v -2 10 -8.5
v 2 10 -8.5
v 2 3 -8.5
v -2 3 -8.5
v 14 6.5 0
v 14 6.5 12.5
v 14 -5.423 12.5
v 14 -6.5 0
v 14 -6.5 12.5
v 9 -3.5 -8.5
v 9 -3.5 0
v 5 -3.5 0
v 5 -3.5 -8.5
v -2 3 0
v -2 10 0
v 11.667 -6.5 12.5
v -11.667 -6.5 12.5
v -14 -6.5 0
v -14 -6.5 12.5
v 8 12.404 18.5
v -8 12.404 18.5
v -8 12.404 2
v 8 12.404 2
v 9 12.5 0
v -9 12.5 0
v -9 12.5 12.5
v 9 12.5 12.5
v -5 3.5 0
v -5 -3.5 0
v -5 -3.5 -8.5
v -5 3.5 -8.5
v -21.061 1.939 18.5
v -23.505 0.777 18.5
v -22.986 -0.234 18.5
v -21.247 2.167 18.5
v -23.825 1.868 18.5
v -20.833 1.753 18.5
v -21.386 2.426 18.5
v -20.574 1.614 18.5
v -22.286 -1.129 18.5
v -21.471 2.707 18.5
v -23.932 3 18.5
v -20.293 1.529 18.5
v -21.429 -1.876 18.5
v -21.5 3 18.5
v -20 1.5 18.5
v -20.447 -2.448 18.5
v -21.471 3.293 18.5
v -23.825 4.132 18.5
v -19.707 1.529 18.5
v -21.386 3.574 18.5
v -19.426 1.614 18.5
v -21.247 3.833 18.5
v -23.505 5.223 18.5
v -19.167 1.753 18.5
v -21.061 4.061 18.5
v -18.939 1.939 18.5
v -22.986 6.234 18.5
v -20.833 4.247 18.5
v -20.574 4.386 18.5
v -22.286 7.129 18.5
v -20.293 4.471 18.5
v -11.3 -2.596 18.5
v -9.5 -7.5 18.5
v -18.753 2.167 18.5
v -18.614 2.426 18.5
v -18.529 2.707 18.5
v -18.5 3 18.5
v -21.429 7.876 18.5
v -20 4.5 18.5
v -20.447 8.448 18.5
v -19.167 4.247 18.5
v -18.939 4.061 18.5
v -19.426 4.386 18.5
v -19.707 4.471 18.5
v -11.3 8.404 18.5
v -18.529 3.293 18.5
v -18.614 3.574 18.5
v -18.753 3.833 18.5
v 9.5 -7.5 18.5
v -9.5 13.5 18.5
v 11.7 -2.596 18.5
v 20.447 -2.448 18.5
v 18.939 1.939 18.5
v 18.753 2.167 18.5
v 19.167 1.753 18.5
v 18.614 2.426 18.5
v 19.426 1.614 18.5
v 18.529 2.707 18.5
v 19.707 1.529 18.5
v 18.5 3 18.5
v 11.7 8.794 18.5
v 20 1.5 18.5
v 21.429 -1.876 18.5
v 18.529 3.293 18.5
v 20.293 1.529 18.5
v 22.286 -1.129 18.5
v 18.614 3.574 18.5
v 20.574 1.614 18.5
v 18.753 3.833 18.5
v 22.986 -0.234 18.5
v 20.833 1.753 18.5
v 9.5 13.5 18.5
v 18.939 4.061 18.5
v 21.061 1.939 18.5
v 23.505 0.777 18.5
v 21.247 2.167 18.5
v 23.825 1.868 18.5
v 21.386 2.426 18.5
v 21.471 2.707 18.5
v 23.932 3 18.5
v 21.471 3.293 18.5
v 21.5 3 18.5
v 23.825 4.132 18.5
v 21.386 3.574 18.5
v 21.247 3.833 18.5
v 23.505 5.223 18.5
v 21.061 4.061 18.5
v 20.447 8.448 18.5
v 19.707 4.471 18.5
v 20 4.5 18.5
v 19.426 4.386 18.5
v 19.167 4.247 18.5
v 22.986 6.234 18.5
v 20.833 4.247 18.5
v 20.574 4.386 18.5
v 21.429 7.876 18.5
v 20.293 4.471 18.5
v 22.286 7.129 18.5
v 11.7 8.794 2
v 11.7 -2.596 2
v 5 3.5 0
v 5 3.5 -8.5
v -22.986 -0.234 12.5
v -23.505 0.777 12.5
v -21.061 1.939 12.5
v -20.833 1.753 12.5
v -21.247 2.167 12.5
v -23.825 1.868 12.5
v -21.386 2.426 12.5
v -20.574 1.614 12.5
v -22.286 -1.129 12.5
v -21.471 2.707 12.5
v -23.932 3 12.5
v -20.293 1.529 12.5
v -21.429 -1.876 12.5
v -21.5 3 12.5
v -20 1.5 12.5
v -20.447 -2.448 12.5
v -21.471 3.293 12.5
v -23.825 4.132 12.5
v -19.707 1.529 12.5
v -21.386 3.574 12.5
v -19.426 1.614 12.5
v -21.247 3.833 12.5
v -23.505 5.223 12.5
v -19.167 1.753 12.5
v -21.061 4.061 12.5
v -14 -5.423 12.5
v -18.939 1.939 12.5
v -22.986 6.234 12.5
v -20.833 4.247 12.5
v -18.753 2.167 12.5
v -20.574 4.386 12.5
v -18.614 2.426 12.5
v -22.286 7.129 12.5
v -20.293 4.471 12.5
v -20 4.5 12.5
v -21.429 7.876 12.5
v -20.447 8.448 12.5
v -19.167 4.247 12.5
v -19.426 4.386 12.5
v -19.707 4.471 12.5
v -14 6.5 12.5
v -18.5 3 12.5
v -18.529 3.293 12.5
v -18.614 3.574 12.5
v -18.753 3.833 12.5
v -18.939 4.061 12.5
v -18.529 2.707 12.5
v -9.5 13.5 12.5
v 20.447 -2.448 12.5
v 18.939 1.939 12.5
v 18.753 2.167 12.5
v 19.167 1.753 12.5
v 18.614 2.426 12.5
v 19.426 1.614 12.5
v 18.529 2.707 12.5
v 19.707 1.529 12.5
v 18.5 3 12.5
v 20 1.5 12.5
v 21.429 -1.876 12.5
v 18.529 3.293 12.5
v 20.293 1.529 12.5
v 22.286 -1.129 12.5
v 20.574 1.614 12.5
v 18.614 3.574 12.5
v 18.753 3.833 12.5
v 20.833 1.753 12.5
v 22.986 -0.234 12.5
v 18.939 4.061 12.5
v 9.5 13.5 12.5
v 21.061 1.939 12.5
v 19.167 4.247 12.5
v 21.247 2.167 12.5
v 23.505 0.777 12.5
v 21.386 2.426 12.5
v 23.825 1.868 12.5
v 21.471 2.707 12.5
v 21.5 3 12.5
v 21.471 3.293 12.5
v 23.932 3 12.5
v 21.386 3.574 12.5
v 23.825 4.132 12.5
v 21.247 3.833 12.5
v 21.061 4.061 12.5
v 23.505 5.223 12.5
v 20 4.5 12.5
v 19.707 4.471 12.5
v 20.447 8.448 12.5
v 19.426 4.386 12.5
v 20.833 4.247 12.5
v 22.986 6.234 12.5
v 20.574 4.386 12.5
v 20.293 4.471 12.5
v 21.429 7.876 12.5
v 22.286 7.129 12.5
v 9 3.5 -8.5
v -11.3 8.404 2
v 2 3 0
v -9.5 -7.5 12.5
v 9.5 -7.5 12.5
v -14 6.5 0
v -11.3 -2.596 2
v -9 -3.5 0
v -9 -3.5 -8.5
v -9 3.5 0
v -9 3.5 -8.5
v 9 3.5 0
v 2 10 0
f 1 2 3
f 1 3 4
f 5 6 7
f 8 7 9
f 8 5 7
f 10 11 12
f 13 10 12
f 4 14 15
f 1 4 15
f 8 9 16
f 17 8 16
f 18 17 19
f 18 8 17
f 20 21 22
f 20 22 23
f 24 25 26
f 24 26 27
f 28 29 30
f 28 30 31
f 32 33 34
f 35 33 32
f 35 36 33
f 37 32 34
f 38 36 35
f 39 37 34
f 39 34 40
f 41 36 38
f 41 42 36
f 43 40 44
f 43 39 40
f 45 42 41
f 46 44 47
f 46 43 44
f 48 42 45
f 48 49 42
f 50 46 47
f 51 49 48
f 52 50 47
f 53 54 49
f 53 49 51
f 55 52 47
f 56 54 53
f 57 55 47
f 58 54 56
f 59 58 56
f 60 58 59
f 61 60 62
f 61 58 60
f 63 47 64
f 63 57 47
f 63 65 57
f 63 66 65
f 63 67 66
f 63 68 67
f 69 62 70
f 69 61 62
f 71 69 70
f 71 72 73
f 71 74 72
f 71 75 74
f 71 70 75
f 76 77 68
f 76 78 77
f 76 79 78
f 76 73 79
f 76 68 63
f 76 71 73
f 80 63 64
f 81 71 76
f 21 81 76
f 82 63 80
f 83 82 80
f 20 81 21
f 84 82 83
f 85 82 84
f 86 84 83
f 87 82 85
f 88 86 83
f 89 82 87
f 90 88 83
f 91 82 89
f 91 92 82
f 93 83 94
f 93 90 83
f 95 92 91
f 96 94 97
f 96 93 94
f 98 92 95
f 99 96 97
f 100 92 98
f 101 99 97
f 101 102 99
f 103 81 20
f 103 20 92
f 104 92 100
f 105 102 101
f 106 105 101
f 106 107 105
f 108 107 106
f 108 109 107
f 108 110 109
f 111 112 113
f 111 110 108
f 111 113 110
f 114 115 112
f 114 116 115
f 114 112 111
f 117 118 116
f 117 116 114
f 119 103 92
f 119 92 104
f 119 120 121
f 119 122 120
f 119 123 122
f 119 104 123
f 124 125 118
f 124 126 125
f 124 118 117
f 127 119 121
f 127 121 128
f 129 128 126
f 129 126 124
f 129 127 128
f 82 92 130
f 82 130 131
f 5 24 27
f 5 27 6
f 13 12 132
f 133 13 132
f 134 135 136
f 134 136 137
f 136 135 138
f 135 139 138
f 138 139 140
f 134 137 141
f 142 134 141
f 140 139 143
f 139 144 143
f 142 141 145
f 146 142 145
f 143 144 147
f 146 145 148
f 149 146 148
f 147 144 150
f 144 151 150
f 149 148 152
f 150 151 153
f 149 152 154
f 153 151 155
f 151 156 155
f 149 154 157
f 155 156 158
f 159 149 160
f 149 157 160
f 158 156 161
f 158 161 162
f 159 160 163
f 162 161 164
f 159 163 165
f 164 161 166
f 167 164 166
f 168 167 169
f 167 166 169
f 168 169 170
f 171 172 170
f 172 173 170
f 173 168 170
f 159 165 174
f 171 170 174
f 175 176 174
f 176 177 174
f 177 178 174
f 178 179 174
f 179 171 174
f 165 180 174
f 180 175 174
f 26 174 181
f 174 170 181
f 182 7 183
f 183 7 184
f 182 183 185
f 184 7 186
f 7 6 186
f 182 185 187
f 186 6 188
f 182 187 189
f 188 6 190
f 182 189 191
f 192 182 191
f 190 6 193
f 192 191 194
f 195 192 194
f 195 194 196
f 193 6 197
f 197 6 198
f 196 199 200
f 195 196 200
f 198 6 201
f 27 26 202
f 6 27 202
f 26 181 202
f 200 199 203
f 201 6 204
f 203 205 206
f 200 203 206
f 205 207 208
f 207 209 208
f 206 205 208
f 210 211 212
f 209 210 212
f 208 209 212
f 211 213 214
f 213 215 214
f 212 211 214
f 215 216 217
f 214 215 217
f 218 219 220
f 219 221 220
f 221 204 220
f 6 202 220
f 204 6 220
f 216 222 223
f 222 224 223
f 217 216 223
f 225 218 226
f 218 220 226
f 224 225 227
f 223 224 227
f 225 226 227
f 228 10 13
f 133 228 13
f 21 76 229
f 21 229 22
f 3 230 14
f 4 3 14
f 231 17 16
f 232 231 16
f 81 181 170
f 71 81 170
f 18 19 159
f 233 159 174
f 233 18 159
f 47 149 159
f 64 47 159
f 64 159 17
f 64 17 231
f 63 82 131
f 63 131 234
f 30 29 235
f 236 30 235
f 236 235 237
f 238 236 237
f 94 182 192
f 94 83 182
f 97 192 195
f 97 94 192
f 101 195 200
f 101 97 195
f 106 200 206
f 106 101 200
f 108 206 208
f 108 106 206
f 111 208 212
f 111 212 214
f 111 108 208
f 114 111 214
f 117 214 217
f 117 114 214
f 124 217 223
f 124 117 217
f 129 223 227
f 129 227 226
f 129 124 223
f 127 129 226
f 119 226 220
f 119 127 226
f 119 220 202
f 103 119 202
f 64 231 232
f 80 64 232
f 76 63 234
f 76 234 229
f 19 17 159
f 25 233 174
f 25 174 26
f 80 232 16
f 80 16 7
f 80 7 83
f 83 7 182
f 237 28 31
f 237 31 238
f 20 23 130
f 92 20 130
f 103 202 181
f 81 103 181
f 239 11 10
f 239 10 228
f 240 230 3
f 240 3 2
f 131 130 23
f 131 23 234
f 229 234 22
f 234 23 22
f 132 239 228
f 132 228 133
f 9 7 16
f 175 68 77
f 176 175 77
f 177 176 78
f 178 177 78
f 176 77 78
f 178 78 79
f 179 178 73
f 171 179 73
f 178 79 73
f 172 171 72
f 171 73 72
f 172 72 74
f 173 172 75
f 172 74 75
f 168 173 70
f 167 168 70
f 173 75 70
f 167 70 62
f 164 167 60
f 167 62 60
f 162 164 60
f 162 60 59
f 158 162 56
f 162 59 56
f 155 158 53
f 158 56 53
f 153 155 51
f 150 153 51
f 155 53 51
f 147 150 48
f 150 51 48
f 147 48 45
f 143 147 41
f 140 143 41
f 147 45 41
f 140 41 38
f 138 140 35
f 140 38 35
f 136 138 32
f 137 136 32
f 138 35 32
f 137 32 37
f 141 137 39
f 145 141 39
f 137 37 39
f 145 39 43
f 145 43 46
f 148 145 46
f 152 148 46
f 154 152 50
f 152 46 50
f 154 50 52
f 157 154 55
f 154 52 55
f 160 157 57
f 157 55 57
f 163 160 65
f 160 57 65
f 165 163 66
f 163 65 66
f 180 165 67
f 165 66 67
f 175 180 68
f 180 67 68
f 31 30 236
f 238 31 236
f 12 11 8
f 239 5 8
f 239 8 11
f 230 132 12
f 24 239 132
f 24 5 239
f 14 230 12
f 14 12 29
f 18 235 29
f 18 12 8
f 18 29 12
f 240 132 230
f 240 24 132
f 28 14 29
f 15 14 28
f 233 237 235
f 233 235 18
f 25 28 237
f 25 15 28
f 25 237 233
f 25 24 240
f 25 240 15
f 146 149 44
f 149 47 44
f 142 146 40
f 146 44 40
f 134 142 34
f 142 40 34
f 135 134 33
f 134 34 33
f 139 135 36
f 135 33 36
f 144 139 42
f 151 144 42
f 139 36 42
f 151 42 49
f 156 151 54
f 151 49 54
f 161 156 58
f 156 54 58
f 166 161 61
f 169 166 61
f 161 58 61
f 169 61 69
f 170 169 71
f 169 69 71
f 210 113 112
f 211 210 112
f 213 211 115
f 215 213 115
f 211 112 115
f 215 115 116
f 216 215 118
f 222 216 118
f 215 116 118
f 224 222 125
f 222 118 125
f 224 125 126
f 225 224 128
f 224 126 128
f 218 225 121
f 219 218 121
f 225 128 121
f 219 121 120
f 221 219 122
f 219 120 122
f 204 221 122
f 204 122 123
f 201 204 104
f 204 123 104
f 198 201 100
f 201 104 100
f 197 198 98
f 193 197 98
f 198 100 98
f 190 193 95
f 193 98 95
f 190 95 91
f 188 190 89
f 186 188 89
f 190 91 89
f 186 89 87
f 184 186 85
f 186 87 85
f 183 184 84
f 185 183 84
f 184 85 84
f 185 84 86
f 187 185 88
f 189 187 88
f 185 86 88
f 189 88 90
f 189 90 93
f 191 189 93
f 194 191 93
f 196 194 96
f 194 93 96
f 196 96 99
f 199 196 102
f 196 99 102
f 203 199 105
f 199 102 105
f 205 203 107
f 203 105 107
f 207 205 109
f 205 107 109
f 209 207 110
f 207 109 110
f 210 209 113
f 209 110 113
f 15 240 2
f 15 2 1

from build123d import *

# Parameters (mm, degrees)
RESSALTO_EXTRUS_O1_DEPTH = 12.5
ESBO_O2_W                = 4
ESBO_O2_H                = 7
RESSALTO_EXTRUS_O2_DEPTH = 8.5
RESSALTO_EXTRUS_O3_DEPTH = 6
ESBO_O4_R                = 1.5
CORTE_EXTRUS_O1_DEPTH    = 6
FILETE1_R                = 6
CORTE_EXTRUS_O2_DEPTH    = 16.5


with BuildPart() as part:
    # Esboço1 → Ressalto-extrusão1 (new body)
    with BuildSketch(Plane.XY):
        Polygon((-9, 12.5), (9, 12.5), (14, 6.5), (14, -6.5), (-14, -6.5), (-14, 6.5), align=None)
    extrude(amount=RESSALTO_EXTRUS_O1_DEPTH)

    # Esboço2 → Ressalto-extrusão2 (add)
    with BuildSketch(Plane(origin=(0, 0, 0), x_dir=(-1, 0, 0), z_dir=(0, 0, -1))):
        with Locations((-7, 0)):
            Rectangle(ESBO_O2_W, ESBO_O2_H)
        with Locations((0, 6.5)):
            Rectangle(ESBO_O2_W, ESBO_O2_H)
        with Locations((7, 0)):
            Rectangle(ESBO_O2_W, ESBO_O2_H)
    extrude(amount=RESSALTO_EXTRUS_O2_DEPTH)

    # Esboço3 → Ressalto-extrusão3 (add)
    with BuildSketch(Plane.XY.offset(12.5)):
        Polygon((-9.5, -7.5), (9.5, -7.5), (32.25, 3), (9.5, 13.5), (-9.5, 13.5), (-32.25, 3), align=None)
    extrude(amount=RESSALTO_EXTRUS_O3_DEPTH)

    # Esboço4 → Corte-extrusão1 (cut)
    with BuildSketch(Plane.XY.offset(18.5)):
        with Locations((-20, 3)):
            Circle(ESBO_O4_R)
        with Locations((20, 3)):
            Circle(ESBO_O4_R)
    extrude(amount=-CORTE_EXTRUS_O1_DEPTH, mode=Mode.SUBTRACT)

    # Filete1
    filete1_edges = [part.edges().sort_by_distance(p)[0] for p in [
        (-32.25, 3, 15.5),
        (32.25, 3, 15.5),
    ]]
    fillet(filete1_edges, radius=FILETE1_R)

    # Esboço5 → Corte-extrusão2 (cut)
    with BuildSketch(Plane.XY.offset(18.5)):
        Polygon((-8, 12.404340661), (8, 12.404340661), (11.700014981, 8.793750875), (11.700014981, -2.595659339), (-11.299985019, -2.595659339), (-11.299985019, 8.404340661), align=None)
    extrude(amount=-CORTE_EXTRUS_O2_DEPTH, mode=Mode.SUBTRACT)


solid = part.part
